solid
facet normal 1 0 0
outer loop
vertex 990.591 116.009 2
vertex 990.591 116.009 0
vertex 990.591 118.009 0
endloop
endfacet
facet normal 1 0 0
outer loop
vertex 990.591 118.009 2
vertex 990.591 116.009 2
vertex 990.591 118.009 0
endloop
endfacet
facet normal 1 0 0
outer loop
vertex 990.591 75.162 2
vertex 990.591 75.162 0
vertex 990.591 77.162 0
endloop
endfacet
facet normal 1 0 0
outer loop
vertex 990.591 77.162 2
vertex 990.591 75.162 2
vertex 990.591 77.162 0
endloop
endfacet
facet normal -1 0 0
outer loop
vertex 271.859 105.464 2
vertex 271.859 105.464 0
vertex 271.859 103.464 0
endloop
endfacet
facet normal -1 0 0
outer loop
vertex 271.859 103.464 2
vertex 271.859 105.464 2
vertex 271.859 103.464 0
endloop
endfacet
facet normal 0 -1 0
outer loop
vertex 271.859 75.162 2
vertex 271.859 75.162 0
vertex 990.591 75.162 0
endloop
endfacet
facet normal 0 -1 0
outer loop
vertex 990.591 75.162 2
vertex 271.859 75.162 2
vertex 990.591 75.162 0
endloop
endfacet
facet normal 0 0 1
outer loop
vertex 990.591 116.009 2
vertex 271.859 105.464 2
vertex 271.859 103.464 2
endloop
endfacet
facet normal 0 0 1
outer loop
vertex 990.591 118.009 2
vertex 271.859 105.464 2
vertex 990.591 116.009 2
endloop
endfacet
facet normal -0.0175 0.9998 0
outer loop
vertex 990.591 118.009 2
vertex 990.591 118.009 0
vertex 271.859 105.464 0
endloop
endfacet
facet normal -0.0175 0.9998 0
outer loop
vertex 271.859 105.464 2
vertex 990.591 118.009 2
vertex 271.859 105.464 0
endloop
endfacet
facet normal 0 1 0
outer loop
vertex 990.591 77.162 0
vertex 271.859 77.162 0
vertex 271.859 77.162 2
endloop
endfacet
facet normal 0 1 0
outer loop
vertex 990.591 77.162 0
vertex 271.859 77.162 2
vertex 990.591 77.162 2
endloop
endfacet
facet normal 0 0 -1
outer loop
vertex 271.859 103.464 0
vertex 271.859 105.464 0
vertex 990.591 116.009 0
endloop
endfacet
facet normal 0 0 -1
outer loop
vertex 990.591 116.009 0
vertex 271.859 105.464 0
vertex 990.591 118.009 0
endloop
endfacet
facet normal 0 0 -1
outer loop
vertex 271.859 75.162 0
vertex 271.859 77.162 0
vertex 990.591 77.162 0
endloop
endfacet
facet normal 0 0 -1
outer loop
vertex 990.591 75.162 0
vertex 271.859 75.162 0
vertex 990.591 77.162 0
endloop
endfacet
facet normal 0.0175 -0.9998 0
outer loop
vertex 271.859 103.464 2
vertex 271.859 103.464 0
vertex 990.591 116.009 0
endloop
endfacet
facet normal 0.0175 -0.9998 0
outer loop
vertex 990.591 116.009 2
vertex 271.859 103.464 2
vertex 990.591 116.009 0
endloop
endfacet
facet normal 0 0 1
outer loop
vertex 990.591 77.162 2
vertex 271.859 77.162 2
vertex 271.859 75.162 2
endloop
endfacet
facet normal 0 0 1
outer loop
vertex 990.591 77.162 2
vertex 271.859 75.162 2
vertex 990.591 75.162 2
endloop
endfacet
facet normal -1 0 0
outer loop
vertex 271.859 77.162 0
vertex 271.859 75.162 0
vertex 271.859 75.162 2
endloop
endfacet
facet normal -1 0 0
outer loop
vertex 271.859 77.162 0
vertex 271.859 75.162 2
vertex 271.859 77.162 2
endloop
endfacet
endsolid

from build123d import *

# Parameters (mm, degrees)
MODEL_W           = 718.7316
MODEL_H           = 2
EXTRUDE_1_DEPTH   = 2
EXTRUDE_1_2_DEPTH = 2


with BuildPart() as part:
    # Model → 凸台-拉伸1 (new body)
    with BuildSketch(Plane.XY):
        with Locations((631.225241677, 76.161607892)):
            Rectangle(MODEL_W, MODEL_H)
    extrude(amount=EXTRUDE_1_DEPTH)


with BuildPart() as body_2:
    # Model → Extrude 1 2 (new body)
    with BuildSketch(Plane.XY):
        Polygon((271.859441677, 103.463901148), (990.591041677, 116.009407892), (990.591041677, 118.009407892), (271.859441677, 105.463901148), align=None)
    extrude(amount=EXTRUDE_1_2_DEPTH)


solid = Compound([part.part, body_2.part])
